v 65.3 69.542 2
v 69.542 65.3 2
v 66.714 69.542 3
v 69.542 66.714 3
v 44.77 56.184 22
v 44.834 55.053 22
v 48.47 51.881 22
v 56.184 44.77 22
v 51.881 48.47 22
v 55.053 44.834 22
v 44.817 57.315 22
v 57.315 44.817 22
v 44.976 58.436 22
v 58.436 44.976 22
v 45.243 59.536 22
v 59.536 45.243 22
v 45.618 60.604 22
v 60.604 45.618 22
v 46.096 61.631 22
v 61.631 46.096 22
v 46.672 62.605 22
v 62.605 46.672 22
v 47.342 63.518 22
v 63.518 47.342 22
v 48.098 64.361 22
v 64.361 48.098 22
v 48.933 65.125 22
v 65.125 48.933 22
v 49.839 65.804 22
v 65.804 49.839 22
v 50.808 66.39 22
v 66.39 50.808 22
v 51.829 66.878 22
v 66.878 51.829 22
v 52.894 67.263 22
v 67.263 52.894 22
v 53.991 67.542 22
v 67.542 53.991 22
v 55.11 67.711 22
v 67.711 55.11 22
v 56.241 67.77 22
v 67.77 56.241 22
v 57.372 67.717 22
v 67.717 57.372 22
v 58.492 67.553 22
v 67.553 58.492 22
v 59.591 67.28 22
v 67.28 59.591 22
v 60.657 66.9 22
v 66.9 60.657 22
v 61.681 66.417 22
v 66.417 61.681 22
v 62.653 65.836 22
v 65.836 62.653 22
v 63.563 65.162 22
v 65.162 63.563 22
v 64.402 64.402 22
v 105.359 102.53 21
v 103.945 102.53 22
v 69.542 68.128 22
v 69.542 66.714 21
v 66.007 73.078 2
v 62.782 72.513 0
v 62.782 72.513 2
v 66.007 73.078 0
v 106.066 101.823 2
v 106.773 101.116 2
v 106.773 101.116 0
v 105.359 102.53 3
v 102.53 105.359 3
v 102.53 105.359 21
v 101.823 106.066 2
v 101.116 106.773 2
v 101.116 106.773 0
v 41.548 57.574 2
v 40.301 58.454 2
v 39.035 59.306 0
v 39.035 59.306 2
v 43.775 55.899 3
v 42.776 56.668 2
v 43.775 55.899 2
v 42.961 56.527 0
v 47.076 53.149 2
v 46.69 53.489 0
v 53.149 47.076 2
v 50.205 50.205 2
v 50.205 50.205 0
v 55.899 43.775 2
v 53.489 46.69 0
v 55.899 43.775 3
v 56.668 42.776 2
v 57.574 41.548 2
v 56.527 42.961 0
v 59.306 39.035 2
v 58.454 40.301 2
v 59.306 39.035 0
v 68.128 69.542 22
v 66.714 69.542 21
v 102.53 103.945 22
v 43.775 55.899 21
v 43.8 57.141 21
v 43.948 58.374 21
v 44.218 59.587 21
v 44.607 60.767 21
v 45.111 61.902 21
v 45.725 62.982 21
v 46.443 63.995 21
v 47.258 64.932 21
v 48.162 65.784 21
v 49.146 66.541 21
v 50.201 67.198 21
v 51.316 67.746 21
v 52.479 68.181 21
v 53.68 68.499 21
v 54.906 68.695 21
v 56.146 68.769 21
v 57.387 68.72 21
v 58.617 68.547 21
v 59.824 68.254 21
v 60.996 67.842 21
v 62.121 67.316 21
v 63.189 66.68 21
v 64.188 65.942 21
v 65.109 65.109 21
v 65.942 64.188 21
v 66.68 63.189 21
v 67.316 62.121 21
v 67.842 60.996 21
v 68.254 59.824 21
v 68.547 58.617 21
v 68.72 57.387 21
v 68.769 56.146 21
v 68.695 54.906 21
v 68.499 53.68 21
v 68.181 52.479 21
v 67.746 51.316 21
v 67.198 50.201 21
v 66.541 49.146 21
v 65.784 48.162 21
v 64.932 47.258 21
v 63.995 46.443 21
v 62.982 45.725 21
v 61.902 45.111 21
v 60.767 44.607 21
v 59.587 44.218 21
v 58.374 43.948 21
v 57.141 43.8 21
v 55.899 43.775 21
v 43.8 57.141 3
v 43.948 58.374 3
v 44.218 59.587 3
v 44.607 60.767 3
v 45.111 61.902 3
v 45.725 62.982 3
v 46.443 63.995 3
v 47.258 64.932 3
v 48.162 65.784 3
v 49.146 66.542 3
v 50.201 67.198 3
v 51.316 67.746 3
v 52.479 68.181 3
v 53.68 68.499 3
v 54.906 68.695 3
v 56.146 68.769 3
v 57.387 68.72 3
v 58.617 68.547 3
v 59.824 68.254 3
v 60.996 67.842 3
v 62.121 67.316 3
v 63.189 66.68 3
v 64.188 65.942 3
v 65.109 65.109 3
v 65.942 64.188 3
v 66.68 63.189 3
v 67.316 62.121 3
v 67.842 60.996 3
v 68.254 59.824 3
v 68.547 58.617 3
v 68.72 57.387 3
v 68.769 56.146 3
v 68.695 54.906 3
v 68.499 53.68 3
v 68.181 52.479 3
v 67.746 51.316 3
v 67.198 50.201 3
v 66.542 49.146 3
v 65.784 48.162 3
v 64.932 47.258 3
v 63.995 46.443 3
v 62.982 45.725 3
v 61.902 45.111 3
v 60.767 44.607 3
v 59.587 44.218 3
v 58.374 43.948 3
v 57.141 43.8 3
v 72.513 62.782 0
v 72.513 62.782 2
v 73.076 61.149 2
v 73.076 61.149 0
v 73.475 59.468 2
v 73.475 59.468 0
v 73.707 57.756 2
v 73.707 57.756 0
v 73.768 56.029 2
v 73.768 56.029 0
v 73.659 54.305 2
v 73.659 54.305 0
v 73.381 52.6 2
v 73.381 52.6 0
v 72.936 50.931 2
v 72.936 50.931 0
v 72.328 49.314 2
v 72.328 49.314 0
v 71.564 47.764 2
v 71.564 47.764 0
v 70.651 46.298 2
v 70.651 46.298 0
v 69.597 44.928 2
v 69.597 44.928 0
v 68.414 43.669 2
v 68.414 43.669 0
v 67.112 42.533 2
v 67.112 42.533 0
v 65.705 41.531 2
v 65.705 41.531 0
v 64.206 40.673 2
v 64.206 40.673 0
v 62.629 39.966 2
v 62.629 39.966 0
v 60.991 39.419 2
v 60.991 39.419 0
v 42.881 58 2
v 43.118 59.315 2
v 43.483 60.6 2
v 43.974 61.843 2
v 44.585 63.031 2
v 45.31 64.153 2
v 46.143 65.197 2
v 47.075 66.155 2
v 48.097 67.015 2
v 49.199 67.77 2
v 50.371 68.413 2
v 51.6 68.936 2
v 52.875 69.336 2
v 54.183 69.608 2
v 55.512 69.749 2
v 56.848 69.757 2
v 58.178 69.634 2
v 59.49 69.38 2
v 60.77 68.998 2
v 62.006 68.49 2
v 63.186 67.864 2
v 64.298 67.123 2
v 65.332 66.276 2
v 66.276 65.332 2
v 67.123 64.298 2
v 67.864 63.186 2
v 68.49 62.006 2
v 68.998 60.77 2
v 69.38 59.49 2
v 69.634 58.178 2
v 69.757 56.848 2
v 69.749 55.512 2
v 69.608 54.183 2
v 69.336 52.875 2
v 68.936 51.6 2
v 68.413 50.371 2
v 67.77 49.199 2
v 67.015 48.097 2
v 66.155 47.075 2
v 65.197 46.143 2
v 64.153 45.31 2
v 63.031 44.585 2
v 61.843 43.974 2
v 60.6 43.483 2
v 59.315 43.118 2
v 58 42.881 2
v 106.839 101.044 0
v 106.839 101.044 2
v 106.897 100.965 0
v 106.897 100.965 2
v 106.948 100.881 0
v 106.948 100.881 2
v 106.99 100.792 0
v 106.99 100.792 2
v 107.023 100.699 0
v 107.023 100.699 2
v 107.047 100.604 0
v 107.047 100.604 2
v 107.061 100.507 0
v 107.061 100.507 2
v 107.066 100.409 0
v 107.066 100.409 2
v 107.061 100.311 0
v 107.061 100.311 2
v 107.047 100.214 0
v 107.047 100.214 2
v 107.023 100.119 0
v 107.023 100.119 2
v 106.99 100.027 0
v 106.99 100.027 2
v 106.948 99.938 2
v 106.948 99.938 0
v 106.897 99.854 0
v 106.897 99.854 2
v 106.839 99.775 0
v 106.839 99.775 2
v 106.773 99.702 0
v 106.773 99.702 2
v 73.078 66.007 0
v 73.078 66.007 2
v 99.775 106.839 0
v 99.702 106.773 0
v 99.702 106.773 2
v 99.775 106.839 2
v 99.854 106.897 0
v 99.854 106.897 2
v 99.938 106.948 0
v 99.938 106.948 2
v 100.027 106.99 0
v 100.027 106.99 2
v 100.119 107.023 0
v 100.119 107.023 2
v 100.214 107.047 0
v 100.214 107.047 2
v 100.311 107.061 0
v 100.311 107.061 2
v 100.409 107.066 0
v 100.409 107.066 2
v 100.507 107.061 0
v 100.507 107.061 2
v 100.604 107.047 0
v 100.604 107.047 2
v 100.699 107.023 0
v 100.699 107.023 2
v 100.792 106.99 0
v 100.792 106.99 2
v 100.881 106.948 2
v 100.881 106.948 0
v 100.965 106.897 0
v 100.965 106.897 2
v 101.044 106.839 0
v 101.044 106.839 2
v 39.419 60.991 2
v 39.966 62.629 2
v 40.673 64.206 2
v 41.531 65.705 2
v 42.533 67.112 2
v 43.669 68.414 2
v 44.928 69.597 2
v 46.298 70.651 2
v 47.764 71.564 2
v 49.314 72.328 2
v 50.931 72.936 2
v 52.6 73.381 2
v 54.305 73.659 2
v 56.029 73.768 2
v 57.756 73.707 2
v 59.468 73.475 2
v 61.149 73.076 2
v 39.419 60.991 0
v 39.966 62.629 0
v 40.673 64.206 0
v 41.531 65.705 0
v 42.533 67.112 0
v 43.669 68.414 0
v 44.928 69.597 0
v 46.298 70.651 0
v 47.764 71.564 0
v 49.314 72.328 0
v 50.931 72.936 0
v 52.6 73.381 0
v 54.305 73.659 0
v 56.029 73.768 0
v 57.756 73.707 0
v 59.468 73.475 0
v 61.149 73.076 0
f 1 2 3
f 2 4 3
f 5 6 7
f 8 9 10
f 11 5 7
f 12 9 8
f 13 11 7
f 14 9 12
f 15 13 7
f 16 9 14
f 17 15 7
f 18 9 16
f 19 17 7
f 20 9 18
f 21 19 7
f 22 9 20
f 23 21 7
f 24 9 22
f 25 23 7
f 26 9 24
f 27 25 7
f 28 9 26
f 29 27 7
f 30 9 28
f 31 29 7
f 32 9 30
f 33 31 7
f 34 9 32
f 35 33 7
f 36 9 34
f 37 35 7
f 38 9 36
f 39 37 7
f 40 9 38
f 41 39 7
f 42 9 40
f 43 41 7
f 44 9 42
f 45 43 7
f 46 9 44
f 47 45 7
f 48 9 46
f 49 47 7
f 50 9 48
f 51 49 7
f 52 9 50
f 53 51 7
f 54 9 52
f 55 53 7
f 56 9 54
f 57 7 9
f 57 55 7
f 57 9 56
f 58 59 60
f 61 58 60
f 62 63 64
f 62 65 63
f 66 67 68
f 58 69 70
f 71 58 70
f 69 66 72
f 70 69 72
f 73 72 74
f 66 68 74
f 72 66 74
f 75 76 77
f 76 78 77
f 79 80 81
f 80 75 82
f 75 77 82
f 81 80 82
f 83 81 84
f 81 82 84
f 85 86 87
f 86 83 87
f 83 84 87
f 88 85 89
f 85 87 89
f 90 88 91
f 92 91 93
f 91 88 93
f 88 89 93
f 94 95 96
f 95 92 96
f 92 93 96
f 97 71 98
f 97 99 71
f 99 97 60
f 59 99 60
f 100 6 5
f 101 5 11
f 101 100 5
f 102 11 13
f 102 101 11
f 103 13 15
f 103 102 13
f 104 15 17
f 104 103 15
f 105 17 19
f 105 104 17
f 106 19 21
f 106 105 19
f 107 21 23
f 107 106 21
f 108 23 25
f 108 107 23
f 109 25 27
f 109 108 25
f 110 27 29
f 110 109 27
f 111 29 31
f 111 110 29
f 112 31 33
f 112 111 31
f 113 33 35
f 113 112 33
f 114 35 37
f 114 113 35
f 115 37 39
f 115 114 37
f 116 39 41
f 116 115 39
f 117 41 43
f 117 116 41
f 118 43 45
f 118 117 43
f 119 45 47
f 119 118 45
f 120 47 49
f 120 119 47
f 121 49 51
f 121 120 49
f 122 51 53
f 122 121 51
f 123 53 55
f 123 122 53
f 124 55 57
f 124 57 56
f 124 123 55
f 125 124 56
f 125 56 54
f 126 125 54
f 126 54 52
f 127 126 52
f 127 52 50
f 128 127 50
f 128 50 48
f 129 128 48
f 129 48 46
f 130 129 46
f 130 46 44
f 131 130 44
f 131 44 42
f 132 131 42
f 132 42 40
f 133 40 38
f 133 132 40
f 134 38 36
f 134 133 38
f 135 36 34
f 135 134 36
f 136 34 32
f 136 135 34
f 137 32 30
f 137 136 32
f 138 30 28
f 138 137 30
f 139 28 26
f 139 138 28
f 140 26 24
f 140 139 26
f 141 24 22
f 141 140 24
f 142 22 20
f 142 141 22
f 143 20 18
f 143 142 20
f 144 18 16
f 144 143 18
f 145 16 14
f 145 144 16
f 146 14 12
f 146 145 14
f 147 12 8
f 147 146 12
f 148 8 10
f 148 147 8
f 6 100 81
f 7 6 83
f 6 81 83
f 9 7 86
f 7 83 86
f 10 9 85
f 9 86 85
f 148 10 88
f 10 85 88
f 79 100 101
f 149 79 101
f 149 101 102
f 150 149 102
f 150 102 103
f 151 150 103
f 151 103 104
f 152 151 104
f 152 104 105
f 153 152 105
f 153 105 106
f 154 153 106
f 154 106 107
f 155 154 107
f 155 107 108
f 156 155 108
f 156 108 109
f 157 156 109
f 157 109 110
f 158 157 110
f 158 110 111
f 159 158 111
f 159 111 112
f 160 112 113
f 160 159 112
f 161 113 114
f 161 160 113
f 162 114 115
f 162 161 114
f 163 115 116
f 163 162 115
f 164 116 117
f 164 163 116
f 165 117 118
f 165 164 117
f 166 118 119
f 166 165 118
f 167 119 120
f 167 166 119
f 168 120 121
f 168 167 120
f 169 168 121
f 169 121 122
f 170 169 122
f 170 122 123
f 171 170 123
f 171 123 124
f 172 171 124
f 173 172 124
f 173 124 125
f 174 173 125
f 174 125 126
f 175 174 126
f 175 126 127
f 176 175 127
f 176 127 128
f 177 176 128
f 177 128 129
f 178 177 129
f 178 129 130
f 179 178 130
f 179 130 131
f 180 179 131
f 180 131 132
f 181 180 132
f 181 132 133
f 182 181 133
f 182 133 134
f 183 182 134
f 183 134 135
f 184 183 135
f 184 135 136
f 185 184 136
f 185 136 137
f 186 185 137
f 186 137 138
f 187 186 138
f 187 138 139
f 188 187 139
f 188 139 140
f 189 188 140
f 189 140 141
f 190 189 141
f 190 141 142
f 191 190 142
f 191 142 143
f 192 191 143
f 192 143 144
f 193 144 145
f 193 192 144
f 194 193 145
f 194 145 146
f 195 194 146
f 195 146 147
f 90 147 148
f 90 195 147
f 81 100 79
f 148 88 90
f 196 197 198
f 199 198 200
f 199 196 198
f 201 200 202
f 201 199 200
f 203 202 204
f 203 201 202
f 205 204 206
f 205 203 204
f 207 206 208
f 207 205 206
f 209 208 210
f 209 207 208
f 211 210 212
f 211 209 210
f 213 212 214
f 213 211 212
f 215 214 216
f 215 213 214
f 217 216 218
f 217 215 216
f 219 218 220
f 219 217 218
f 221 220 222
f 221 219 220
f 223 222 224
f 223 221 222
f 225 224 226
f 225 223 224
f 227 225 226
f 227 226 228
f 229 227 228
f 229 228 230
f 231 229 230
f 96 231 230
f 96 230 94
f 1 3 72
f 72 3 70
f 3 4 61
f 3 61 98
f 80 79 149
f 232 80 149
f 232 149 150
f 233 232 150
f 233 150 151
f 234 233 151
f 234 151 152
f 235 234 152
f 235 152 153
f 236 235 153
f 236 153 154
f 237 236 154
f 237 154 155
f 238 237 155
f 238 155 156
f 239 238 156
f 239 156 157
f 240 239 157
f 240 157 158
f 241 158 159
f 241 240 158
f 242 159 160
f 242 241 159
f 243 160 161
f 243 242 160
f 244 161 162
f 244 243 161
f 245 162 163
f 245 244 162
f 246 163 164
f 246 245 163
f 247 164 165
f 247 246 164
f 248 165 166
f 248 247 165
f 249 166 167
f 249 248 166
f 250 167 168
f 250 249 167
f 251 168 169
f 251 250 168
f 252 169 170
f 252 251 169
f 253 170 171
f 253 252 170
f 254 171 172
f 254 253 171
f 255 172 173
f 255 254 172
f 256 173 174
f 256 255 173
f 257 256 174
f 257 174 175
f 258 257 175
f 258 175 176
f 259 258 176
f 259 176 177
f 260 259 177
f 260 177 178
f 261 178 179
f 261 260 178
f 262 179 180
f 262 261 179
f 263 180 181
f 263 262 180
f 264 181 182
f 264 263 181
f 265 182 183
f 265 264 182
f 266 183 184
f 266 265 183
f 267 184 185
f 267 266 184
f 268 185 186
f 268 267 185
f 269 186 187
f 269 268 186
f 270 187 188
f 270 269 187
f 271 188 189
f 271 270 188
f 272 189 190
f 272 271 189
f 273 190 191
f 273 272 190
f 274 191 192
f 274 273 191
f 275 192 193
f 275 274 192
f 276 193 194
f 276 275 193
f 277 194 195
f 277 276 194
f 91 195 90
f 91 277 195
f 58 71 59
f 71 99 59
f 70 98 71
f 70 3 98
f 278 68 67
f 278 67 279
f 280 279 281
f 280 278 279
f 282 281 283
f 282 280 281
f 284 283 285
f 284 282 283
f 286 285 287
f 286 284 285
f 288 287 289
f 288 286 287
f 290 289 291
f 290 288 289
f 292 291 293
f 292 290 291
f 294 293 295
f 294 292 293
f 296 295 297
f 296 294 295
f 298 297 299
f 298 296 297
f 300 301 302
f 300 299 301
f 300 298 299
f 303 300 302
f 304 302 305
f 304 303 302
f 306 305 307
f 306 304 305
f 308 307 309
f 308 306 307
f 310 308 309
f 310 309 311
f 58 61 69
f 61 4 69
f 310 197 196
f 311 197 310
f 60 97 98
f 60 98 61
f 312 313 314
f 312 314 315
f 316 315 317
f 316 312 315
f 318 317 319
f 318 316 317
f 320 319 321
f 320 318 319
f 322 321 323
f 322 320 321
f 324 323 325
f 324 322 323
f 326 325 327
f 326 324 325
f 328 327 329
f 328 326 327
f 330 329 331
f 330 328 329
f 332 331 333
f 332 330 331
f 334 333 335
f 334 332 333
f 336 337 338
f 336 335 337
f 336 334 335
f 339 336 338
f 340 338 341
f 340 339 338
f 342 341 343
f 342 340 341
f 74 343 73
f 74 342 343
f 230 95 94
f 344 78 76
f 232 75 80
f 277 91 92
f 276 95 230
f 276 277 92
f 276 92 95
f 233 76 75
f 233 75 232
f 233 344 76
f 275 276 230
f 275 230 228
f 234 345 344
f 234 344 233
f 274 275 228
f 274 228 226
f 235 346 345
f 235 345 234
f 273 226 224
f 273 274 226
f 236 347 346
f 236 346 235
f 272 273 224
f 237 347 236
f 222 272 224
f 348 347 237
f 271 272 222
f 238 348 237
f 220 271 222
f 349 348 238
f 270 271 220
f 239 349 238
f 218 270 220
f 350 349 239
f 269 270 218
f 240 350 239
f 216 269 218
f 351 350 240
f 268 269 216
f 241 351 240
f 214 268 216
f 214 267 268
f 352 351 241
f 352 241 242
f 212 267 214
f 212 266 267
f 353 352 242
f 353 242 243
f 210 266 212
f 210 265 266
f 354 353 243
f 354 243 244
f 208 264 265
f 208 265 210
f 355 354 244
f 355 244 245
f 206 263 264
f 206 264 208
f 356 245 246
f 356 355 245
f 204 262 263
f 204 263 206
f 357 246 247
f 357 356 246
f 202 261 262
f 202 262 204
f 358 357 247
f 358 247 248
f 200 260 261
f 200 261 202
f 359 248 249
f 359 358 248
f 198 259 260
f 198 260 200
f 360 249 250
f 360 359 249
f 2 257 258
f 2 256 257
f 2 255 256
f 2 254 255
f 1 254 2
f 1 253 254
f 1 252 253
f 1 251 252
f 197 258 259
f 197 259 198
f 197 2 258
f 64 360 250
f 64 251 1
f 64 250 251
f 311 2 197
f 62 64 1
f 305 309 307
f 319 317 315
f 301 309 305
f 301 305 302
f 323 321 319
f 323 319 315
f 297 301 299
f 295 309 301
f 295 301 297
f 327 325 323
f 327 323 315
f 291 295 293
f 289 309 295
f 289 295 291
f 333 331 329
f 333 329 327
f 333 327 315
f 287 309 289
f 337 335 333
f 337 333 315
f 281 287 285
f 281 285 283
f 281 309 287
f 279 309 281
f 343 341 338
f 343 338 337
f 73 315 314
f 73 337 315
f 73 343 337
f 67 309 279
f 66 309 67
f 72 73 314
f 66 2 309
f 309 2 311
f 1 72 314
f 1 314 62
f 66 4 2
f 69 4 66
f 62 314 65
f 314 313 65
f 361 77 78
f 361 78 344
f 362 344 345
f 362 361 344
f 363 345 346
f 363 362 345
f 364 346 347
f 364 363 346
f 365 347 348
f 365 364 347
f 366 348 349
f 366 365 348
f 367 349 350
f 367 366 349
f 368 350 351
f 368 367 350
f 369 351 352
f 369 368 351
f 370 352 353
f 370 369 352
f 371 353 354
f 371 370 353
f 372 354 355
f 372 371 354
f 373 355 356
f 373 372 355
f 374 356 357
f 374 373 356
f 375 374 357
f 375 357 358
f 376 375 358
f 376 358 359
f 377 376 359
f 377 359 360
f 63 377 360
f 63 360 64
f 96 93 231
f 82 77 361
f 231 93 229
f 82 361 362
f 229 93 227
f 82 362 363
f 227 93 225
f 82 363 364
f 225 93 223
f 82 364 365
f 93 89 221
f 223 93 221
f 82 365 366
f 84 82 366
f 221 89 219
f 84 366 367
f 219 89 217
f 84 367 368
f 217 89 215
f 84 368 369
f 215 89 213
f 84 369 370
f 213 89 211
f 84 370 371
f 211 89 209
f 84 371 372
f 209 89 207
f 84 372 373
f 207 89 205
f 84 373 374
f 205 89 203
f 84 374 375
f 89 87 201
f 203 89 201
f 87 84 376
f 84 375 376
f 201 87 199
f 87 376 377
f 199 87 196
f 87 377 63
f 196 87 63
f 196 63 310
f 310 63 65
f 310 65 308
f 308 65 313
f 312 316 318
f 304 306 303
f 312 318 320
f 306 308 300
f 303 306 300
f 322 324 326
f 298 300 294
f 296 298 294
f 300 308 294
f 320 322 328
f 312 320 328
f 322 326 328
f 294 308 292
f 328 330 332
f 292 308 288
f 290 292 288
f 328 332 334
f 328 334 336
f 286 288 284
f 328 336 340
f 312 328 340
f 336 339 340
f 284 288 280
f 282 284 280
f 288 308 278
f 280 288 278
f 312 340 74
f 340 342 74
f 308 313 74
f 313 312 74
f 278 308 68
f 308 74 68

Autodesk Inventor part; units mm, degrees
ref_plane "YZ Plane" through (0, 0, 0) normal (1, 0, 0) x (0, 1, 0)
ref_plane "XZ Plane" through (0, 0, 0) normal (0, 1, 0) x (-1, 0, 0)
ref_plane "XY Plane" through (0, 0, 0) normal (0, 0, 1) x (1, 0, 0)
sketch "Sketch3" plane through (0, 0, 0) normal (0, 0, 1) x (1, 0, 0)
  line L0 (0, 0) -> (103.9447, 103.9447)
  line L1 (0, 0) -> (147, 0) construction
  arc A0 (67.2085, 42.6098) -> (42.6098, 67.2085) centre (0, 0) ccw
  circle A1 centre (56.2698, 56.2698) radius 17.5
  circle A2 centre (0, 0) radius 71
  line L2 (67.2085, 42.6098) -> (63.0672, 32.6118)
  line L3 (67.2085, 42.6098) -> (78.0302, 42.6098) construction
  line L4 (42.6098, 67.2085) -> (32.6118, 63.0672)
  line L5 (42.6098, 67.2085) -> (53.4315, 67.2085) construction
  line L6 (106.7731, 99.7021) -> (12.0711, 5)
  line L7 (12.0711, 5) -> (147, 5)
  line L8 (99.7021, 106.7731) -> (-12.0711, -5)
  line L9 (-12.0711, -5) -> (147, -5)
  line L10 (103.9447, 103.9447) -> (101.1163, 106.7731)
  line L11 (103.9447, 103.9447) -> (106.7731, 101.1163)
  arc A3 (101.1163, 106.7731) -> (99.7021, 106.7731) centre (100.4092, 106.066) ccw
  arc A4 (106.7731, 99.7021) -> (106.7731, 101.1163) centre (106.066, 100.4092) ccw
  point P0 (71.6638, 64.5928)
  point P1 (64.5928, 71.6638)
  point P2 (68.6441, 68.6441)
  point P3 (70.8237, -5)
  point P4 (40.8757, 47.9468)
  point P5 (39.0352, 59.3064)
  point P6 (46.5444, 53.6155)
  point P7 (70.8237, 5)
  point P8 (47.9468, 40.8757)
  point P9 (53.6155, 46.5444)
  point P10 (59.3064, 39.0352)
  point P11 (43.8954, 43.8954)
  point P12 (50.2046, 50.2046)
  dimension "d26" = 147
  dimension "d27" = 45
  dimension "d28" = 159.1549
  dimension "d29" = 35
  dimension "d30" = 142
  dimension "d31" = 112.5
  dimension "d32" = 157.5
  dimension "d33" = 5
  dimension "d34" = 5
  dimension "d35" = 1
extrude "Extrusion2" add sketch "Sketch3" along normal blind 2 contours A2 L8 A0 L0 | L0 A0 L6 A2 | A0 L8 A1 L0 | L0 A1 L6 A0 | L6 A0 A1 A2 | A2 A1 A0 L8 | A1 L8 A3 L10 L0 | L0 L11 A4 L6 A1 | L6 A1 A0 | A0 A1 L8
sketch "Sketch4" plane through (0, 0, 2) normal (0, 0, 1) x (1, 0, 0)
  arc A0 (64.5928, 71.6638) -> (39.0352, 59.3064) centre (56.2698, 56.2698) ccw projected
  arc A1 (59.3064, 39.0352) -> (71.6638, 64.5928) centre (56.2698, 56.2698) ccw projected
  circle A2 centre (56.2698, 56.2698) radius 12.5
  line L0 (56.2698, 56.2698) -> (103.9447, 103.9447)
  line L1 (54.8556, 57.684) -> (102.5305, 105.3589)
  line L2 (57.684, 54.8556) -> (105.3589, 102.5305)
  line L3 (71.6638, 64.5928) -> (64.5928, 71.6638)
  circle A3 centre (56.2698, 56.2698) radius 7.5
  arc A4 (59.3064, 39.0352) -> (39.0352, 59.3064) centre (0, 0) ccw projected
  arc A5 (65.732, 33.9898) -> (33.9898, 65.732) centre (0, 0) ccw
  line L4 (103.9447, 103.9447) -> (105.3589, 102.5305)
  line L5 (106.7731, 101.1163) -> (101.1163, 106.7731) projected
  line L6 (102.5305, 105.3589) -> (103.9447, 103.9447)
  circle A6 centre (0, 0) radius 93.5775
  circle A7 centre (56.2698, 56.2698) radius 17.5
  point P0 (42.6098, 67.2085)
  point P1 (67.2085, 42.6098)
  point P2 (32.6118, 63.0672)
  point P3 (63.0672, 32.6118)
  point P4 (69.5425, 66.7141)
  point P5 (66.7141, 69.5425)
  point P6 (43.7753, 55.8993)
  point P7 (55.8993, 43.7753)
  point P8 (51.9915, 48.3517)
  point P9 (48.3517, 51.9915)
  point P10 (55.6314, 48.797)
  point P11 (48.797, 55.6314)
  dimension "d38" = 25
  dimension "d39" = 2
  dimension "d40" = 2
  dimension "d41" = 5
  dimension "d56" = 3
  dimension "d66" = 187.1549
  dimension "d67" = 35
extrude "Extrusion3" add sketch "Sketch4" along normal blind 20 contours L1 A7 L0 L3 | L1 L5 L0 A7 | L0 A7 L2 L3 | L0 L4 L2 A7 | A5 A3 A2 A4 | A2 L1 A3 A5 | A2 L0 A3 L1 | A5 A3 | A3 A5 | A2 L2 A3 L0 | A3 L2 A2 A5
chamfer "Chamfer6" distance 1 angle 45 9 edges at (68.1283, 68.1283, 2) (65.1086, 65.1086, 22) (84.6223, 87.4507, 22) (87.4507, 84.6223, 22) (68.1283, 68.1283, 22) (103.9447, 103.9447, 22) (84.6223, 87.4507, 2) (87.4507, 84.6223, 2) (65.1086, 65.1086, 2)
chamfer "Chamfer7" distance 2 angle 45 2 edges at (64.5928, 71.6638, 1) (71.6638, 64.5928, 1)
properties part number "HourGuard_36_wavyV2_3DPrint"
